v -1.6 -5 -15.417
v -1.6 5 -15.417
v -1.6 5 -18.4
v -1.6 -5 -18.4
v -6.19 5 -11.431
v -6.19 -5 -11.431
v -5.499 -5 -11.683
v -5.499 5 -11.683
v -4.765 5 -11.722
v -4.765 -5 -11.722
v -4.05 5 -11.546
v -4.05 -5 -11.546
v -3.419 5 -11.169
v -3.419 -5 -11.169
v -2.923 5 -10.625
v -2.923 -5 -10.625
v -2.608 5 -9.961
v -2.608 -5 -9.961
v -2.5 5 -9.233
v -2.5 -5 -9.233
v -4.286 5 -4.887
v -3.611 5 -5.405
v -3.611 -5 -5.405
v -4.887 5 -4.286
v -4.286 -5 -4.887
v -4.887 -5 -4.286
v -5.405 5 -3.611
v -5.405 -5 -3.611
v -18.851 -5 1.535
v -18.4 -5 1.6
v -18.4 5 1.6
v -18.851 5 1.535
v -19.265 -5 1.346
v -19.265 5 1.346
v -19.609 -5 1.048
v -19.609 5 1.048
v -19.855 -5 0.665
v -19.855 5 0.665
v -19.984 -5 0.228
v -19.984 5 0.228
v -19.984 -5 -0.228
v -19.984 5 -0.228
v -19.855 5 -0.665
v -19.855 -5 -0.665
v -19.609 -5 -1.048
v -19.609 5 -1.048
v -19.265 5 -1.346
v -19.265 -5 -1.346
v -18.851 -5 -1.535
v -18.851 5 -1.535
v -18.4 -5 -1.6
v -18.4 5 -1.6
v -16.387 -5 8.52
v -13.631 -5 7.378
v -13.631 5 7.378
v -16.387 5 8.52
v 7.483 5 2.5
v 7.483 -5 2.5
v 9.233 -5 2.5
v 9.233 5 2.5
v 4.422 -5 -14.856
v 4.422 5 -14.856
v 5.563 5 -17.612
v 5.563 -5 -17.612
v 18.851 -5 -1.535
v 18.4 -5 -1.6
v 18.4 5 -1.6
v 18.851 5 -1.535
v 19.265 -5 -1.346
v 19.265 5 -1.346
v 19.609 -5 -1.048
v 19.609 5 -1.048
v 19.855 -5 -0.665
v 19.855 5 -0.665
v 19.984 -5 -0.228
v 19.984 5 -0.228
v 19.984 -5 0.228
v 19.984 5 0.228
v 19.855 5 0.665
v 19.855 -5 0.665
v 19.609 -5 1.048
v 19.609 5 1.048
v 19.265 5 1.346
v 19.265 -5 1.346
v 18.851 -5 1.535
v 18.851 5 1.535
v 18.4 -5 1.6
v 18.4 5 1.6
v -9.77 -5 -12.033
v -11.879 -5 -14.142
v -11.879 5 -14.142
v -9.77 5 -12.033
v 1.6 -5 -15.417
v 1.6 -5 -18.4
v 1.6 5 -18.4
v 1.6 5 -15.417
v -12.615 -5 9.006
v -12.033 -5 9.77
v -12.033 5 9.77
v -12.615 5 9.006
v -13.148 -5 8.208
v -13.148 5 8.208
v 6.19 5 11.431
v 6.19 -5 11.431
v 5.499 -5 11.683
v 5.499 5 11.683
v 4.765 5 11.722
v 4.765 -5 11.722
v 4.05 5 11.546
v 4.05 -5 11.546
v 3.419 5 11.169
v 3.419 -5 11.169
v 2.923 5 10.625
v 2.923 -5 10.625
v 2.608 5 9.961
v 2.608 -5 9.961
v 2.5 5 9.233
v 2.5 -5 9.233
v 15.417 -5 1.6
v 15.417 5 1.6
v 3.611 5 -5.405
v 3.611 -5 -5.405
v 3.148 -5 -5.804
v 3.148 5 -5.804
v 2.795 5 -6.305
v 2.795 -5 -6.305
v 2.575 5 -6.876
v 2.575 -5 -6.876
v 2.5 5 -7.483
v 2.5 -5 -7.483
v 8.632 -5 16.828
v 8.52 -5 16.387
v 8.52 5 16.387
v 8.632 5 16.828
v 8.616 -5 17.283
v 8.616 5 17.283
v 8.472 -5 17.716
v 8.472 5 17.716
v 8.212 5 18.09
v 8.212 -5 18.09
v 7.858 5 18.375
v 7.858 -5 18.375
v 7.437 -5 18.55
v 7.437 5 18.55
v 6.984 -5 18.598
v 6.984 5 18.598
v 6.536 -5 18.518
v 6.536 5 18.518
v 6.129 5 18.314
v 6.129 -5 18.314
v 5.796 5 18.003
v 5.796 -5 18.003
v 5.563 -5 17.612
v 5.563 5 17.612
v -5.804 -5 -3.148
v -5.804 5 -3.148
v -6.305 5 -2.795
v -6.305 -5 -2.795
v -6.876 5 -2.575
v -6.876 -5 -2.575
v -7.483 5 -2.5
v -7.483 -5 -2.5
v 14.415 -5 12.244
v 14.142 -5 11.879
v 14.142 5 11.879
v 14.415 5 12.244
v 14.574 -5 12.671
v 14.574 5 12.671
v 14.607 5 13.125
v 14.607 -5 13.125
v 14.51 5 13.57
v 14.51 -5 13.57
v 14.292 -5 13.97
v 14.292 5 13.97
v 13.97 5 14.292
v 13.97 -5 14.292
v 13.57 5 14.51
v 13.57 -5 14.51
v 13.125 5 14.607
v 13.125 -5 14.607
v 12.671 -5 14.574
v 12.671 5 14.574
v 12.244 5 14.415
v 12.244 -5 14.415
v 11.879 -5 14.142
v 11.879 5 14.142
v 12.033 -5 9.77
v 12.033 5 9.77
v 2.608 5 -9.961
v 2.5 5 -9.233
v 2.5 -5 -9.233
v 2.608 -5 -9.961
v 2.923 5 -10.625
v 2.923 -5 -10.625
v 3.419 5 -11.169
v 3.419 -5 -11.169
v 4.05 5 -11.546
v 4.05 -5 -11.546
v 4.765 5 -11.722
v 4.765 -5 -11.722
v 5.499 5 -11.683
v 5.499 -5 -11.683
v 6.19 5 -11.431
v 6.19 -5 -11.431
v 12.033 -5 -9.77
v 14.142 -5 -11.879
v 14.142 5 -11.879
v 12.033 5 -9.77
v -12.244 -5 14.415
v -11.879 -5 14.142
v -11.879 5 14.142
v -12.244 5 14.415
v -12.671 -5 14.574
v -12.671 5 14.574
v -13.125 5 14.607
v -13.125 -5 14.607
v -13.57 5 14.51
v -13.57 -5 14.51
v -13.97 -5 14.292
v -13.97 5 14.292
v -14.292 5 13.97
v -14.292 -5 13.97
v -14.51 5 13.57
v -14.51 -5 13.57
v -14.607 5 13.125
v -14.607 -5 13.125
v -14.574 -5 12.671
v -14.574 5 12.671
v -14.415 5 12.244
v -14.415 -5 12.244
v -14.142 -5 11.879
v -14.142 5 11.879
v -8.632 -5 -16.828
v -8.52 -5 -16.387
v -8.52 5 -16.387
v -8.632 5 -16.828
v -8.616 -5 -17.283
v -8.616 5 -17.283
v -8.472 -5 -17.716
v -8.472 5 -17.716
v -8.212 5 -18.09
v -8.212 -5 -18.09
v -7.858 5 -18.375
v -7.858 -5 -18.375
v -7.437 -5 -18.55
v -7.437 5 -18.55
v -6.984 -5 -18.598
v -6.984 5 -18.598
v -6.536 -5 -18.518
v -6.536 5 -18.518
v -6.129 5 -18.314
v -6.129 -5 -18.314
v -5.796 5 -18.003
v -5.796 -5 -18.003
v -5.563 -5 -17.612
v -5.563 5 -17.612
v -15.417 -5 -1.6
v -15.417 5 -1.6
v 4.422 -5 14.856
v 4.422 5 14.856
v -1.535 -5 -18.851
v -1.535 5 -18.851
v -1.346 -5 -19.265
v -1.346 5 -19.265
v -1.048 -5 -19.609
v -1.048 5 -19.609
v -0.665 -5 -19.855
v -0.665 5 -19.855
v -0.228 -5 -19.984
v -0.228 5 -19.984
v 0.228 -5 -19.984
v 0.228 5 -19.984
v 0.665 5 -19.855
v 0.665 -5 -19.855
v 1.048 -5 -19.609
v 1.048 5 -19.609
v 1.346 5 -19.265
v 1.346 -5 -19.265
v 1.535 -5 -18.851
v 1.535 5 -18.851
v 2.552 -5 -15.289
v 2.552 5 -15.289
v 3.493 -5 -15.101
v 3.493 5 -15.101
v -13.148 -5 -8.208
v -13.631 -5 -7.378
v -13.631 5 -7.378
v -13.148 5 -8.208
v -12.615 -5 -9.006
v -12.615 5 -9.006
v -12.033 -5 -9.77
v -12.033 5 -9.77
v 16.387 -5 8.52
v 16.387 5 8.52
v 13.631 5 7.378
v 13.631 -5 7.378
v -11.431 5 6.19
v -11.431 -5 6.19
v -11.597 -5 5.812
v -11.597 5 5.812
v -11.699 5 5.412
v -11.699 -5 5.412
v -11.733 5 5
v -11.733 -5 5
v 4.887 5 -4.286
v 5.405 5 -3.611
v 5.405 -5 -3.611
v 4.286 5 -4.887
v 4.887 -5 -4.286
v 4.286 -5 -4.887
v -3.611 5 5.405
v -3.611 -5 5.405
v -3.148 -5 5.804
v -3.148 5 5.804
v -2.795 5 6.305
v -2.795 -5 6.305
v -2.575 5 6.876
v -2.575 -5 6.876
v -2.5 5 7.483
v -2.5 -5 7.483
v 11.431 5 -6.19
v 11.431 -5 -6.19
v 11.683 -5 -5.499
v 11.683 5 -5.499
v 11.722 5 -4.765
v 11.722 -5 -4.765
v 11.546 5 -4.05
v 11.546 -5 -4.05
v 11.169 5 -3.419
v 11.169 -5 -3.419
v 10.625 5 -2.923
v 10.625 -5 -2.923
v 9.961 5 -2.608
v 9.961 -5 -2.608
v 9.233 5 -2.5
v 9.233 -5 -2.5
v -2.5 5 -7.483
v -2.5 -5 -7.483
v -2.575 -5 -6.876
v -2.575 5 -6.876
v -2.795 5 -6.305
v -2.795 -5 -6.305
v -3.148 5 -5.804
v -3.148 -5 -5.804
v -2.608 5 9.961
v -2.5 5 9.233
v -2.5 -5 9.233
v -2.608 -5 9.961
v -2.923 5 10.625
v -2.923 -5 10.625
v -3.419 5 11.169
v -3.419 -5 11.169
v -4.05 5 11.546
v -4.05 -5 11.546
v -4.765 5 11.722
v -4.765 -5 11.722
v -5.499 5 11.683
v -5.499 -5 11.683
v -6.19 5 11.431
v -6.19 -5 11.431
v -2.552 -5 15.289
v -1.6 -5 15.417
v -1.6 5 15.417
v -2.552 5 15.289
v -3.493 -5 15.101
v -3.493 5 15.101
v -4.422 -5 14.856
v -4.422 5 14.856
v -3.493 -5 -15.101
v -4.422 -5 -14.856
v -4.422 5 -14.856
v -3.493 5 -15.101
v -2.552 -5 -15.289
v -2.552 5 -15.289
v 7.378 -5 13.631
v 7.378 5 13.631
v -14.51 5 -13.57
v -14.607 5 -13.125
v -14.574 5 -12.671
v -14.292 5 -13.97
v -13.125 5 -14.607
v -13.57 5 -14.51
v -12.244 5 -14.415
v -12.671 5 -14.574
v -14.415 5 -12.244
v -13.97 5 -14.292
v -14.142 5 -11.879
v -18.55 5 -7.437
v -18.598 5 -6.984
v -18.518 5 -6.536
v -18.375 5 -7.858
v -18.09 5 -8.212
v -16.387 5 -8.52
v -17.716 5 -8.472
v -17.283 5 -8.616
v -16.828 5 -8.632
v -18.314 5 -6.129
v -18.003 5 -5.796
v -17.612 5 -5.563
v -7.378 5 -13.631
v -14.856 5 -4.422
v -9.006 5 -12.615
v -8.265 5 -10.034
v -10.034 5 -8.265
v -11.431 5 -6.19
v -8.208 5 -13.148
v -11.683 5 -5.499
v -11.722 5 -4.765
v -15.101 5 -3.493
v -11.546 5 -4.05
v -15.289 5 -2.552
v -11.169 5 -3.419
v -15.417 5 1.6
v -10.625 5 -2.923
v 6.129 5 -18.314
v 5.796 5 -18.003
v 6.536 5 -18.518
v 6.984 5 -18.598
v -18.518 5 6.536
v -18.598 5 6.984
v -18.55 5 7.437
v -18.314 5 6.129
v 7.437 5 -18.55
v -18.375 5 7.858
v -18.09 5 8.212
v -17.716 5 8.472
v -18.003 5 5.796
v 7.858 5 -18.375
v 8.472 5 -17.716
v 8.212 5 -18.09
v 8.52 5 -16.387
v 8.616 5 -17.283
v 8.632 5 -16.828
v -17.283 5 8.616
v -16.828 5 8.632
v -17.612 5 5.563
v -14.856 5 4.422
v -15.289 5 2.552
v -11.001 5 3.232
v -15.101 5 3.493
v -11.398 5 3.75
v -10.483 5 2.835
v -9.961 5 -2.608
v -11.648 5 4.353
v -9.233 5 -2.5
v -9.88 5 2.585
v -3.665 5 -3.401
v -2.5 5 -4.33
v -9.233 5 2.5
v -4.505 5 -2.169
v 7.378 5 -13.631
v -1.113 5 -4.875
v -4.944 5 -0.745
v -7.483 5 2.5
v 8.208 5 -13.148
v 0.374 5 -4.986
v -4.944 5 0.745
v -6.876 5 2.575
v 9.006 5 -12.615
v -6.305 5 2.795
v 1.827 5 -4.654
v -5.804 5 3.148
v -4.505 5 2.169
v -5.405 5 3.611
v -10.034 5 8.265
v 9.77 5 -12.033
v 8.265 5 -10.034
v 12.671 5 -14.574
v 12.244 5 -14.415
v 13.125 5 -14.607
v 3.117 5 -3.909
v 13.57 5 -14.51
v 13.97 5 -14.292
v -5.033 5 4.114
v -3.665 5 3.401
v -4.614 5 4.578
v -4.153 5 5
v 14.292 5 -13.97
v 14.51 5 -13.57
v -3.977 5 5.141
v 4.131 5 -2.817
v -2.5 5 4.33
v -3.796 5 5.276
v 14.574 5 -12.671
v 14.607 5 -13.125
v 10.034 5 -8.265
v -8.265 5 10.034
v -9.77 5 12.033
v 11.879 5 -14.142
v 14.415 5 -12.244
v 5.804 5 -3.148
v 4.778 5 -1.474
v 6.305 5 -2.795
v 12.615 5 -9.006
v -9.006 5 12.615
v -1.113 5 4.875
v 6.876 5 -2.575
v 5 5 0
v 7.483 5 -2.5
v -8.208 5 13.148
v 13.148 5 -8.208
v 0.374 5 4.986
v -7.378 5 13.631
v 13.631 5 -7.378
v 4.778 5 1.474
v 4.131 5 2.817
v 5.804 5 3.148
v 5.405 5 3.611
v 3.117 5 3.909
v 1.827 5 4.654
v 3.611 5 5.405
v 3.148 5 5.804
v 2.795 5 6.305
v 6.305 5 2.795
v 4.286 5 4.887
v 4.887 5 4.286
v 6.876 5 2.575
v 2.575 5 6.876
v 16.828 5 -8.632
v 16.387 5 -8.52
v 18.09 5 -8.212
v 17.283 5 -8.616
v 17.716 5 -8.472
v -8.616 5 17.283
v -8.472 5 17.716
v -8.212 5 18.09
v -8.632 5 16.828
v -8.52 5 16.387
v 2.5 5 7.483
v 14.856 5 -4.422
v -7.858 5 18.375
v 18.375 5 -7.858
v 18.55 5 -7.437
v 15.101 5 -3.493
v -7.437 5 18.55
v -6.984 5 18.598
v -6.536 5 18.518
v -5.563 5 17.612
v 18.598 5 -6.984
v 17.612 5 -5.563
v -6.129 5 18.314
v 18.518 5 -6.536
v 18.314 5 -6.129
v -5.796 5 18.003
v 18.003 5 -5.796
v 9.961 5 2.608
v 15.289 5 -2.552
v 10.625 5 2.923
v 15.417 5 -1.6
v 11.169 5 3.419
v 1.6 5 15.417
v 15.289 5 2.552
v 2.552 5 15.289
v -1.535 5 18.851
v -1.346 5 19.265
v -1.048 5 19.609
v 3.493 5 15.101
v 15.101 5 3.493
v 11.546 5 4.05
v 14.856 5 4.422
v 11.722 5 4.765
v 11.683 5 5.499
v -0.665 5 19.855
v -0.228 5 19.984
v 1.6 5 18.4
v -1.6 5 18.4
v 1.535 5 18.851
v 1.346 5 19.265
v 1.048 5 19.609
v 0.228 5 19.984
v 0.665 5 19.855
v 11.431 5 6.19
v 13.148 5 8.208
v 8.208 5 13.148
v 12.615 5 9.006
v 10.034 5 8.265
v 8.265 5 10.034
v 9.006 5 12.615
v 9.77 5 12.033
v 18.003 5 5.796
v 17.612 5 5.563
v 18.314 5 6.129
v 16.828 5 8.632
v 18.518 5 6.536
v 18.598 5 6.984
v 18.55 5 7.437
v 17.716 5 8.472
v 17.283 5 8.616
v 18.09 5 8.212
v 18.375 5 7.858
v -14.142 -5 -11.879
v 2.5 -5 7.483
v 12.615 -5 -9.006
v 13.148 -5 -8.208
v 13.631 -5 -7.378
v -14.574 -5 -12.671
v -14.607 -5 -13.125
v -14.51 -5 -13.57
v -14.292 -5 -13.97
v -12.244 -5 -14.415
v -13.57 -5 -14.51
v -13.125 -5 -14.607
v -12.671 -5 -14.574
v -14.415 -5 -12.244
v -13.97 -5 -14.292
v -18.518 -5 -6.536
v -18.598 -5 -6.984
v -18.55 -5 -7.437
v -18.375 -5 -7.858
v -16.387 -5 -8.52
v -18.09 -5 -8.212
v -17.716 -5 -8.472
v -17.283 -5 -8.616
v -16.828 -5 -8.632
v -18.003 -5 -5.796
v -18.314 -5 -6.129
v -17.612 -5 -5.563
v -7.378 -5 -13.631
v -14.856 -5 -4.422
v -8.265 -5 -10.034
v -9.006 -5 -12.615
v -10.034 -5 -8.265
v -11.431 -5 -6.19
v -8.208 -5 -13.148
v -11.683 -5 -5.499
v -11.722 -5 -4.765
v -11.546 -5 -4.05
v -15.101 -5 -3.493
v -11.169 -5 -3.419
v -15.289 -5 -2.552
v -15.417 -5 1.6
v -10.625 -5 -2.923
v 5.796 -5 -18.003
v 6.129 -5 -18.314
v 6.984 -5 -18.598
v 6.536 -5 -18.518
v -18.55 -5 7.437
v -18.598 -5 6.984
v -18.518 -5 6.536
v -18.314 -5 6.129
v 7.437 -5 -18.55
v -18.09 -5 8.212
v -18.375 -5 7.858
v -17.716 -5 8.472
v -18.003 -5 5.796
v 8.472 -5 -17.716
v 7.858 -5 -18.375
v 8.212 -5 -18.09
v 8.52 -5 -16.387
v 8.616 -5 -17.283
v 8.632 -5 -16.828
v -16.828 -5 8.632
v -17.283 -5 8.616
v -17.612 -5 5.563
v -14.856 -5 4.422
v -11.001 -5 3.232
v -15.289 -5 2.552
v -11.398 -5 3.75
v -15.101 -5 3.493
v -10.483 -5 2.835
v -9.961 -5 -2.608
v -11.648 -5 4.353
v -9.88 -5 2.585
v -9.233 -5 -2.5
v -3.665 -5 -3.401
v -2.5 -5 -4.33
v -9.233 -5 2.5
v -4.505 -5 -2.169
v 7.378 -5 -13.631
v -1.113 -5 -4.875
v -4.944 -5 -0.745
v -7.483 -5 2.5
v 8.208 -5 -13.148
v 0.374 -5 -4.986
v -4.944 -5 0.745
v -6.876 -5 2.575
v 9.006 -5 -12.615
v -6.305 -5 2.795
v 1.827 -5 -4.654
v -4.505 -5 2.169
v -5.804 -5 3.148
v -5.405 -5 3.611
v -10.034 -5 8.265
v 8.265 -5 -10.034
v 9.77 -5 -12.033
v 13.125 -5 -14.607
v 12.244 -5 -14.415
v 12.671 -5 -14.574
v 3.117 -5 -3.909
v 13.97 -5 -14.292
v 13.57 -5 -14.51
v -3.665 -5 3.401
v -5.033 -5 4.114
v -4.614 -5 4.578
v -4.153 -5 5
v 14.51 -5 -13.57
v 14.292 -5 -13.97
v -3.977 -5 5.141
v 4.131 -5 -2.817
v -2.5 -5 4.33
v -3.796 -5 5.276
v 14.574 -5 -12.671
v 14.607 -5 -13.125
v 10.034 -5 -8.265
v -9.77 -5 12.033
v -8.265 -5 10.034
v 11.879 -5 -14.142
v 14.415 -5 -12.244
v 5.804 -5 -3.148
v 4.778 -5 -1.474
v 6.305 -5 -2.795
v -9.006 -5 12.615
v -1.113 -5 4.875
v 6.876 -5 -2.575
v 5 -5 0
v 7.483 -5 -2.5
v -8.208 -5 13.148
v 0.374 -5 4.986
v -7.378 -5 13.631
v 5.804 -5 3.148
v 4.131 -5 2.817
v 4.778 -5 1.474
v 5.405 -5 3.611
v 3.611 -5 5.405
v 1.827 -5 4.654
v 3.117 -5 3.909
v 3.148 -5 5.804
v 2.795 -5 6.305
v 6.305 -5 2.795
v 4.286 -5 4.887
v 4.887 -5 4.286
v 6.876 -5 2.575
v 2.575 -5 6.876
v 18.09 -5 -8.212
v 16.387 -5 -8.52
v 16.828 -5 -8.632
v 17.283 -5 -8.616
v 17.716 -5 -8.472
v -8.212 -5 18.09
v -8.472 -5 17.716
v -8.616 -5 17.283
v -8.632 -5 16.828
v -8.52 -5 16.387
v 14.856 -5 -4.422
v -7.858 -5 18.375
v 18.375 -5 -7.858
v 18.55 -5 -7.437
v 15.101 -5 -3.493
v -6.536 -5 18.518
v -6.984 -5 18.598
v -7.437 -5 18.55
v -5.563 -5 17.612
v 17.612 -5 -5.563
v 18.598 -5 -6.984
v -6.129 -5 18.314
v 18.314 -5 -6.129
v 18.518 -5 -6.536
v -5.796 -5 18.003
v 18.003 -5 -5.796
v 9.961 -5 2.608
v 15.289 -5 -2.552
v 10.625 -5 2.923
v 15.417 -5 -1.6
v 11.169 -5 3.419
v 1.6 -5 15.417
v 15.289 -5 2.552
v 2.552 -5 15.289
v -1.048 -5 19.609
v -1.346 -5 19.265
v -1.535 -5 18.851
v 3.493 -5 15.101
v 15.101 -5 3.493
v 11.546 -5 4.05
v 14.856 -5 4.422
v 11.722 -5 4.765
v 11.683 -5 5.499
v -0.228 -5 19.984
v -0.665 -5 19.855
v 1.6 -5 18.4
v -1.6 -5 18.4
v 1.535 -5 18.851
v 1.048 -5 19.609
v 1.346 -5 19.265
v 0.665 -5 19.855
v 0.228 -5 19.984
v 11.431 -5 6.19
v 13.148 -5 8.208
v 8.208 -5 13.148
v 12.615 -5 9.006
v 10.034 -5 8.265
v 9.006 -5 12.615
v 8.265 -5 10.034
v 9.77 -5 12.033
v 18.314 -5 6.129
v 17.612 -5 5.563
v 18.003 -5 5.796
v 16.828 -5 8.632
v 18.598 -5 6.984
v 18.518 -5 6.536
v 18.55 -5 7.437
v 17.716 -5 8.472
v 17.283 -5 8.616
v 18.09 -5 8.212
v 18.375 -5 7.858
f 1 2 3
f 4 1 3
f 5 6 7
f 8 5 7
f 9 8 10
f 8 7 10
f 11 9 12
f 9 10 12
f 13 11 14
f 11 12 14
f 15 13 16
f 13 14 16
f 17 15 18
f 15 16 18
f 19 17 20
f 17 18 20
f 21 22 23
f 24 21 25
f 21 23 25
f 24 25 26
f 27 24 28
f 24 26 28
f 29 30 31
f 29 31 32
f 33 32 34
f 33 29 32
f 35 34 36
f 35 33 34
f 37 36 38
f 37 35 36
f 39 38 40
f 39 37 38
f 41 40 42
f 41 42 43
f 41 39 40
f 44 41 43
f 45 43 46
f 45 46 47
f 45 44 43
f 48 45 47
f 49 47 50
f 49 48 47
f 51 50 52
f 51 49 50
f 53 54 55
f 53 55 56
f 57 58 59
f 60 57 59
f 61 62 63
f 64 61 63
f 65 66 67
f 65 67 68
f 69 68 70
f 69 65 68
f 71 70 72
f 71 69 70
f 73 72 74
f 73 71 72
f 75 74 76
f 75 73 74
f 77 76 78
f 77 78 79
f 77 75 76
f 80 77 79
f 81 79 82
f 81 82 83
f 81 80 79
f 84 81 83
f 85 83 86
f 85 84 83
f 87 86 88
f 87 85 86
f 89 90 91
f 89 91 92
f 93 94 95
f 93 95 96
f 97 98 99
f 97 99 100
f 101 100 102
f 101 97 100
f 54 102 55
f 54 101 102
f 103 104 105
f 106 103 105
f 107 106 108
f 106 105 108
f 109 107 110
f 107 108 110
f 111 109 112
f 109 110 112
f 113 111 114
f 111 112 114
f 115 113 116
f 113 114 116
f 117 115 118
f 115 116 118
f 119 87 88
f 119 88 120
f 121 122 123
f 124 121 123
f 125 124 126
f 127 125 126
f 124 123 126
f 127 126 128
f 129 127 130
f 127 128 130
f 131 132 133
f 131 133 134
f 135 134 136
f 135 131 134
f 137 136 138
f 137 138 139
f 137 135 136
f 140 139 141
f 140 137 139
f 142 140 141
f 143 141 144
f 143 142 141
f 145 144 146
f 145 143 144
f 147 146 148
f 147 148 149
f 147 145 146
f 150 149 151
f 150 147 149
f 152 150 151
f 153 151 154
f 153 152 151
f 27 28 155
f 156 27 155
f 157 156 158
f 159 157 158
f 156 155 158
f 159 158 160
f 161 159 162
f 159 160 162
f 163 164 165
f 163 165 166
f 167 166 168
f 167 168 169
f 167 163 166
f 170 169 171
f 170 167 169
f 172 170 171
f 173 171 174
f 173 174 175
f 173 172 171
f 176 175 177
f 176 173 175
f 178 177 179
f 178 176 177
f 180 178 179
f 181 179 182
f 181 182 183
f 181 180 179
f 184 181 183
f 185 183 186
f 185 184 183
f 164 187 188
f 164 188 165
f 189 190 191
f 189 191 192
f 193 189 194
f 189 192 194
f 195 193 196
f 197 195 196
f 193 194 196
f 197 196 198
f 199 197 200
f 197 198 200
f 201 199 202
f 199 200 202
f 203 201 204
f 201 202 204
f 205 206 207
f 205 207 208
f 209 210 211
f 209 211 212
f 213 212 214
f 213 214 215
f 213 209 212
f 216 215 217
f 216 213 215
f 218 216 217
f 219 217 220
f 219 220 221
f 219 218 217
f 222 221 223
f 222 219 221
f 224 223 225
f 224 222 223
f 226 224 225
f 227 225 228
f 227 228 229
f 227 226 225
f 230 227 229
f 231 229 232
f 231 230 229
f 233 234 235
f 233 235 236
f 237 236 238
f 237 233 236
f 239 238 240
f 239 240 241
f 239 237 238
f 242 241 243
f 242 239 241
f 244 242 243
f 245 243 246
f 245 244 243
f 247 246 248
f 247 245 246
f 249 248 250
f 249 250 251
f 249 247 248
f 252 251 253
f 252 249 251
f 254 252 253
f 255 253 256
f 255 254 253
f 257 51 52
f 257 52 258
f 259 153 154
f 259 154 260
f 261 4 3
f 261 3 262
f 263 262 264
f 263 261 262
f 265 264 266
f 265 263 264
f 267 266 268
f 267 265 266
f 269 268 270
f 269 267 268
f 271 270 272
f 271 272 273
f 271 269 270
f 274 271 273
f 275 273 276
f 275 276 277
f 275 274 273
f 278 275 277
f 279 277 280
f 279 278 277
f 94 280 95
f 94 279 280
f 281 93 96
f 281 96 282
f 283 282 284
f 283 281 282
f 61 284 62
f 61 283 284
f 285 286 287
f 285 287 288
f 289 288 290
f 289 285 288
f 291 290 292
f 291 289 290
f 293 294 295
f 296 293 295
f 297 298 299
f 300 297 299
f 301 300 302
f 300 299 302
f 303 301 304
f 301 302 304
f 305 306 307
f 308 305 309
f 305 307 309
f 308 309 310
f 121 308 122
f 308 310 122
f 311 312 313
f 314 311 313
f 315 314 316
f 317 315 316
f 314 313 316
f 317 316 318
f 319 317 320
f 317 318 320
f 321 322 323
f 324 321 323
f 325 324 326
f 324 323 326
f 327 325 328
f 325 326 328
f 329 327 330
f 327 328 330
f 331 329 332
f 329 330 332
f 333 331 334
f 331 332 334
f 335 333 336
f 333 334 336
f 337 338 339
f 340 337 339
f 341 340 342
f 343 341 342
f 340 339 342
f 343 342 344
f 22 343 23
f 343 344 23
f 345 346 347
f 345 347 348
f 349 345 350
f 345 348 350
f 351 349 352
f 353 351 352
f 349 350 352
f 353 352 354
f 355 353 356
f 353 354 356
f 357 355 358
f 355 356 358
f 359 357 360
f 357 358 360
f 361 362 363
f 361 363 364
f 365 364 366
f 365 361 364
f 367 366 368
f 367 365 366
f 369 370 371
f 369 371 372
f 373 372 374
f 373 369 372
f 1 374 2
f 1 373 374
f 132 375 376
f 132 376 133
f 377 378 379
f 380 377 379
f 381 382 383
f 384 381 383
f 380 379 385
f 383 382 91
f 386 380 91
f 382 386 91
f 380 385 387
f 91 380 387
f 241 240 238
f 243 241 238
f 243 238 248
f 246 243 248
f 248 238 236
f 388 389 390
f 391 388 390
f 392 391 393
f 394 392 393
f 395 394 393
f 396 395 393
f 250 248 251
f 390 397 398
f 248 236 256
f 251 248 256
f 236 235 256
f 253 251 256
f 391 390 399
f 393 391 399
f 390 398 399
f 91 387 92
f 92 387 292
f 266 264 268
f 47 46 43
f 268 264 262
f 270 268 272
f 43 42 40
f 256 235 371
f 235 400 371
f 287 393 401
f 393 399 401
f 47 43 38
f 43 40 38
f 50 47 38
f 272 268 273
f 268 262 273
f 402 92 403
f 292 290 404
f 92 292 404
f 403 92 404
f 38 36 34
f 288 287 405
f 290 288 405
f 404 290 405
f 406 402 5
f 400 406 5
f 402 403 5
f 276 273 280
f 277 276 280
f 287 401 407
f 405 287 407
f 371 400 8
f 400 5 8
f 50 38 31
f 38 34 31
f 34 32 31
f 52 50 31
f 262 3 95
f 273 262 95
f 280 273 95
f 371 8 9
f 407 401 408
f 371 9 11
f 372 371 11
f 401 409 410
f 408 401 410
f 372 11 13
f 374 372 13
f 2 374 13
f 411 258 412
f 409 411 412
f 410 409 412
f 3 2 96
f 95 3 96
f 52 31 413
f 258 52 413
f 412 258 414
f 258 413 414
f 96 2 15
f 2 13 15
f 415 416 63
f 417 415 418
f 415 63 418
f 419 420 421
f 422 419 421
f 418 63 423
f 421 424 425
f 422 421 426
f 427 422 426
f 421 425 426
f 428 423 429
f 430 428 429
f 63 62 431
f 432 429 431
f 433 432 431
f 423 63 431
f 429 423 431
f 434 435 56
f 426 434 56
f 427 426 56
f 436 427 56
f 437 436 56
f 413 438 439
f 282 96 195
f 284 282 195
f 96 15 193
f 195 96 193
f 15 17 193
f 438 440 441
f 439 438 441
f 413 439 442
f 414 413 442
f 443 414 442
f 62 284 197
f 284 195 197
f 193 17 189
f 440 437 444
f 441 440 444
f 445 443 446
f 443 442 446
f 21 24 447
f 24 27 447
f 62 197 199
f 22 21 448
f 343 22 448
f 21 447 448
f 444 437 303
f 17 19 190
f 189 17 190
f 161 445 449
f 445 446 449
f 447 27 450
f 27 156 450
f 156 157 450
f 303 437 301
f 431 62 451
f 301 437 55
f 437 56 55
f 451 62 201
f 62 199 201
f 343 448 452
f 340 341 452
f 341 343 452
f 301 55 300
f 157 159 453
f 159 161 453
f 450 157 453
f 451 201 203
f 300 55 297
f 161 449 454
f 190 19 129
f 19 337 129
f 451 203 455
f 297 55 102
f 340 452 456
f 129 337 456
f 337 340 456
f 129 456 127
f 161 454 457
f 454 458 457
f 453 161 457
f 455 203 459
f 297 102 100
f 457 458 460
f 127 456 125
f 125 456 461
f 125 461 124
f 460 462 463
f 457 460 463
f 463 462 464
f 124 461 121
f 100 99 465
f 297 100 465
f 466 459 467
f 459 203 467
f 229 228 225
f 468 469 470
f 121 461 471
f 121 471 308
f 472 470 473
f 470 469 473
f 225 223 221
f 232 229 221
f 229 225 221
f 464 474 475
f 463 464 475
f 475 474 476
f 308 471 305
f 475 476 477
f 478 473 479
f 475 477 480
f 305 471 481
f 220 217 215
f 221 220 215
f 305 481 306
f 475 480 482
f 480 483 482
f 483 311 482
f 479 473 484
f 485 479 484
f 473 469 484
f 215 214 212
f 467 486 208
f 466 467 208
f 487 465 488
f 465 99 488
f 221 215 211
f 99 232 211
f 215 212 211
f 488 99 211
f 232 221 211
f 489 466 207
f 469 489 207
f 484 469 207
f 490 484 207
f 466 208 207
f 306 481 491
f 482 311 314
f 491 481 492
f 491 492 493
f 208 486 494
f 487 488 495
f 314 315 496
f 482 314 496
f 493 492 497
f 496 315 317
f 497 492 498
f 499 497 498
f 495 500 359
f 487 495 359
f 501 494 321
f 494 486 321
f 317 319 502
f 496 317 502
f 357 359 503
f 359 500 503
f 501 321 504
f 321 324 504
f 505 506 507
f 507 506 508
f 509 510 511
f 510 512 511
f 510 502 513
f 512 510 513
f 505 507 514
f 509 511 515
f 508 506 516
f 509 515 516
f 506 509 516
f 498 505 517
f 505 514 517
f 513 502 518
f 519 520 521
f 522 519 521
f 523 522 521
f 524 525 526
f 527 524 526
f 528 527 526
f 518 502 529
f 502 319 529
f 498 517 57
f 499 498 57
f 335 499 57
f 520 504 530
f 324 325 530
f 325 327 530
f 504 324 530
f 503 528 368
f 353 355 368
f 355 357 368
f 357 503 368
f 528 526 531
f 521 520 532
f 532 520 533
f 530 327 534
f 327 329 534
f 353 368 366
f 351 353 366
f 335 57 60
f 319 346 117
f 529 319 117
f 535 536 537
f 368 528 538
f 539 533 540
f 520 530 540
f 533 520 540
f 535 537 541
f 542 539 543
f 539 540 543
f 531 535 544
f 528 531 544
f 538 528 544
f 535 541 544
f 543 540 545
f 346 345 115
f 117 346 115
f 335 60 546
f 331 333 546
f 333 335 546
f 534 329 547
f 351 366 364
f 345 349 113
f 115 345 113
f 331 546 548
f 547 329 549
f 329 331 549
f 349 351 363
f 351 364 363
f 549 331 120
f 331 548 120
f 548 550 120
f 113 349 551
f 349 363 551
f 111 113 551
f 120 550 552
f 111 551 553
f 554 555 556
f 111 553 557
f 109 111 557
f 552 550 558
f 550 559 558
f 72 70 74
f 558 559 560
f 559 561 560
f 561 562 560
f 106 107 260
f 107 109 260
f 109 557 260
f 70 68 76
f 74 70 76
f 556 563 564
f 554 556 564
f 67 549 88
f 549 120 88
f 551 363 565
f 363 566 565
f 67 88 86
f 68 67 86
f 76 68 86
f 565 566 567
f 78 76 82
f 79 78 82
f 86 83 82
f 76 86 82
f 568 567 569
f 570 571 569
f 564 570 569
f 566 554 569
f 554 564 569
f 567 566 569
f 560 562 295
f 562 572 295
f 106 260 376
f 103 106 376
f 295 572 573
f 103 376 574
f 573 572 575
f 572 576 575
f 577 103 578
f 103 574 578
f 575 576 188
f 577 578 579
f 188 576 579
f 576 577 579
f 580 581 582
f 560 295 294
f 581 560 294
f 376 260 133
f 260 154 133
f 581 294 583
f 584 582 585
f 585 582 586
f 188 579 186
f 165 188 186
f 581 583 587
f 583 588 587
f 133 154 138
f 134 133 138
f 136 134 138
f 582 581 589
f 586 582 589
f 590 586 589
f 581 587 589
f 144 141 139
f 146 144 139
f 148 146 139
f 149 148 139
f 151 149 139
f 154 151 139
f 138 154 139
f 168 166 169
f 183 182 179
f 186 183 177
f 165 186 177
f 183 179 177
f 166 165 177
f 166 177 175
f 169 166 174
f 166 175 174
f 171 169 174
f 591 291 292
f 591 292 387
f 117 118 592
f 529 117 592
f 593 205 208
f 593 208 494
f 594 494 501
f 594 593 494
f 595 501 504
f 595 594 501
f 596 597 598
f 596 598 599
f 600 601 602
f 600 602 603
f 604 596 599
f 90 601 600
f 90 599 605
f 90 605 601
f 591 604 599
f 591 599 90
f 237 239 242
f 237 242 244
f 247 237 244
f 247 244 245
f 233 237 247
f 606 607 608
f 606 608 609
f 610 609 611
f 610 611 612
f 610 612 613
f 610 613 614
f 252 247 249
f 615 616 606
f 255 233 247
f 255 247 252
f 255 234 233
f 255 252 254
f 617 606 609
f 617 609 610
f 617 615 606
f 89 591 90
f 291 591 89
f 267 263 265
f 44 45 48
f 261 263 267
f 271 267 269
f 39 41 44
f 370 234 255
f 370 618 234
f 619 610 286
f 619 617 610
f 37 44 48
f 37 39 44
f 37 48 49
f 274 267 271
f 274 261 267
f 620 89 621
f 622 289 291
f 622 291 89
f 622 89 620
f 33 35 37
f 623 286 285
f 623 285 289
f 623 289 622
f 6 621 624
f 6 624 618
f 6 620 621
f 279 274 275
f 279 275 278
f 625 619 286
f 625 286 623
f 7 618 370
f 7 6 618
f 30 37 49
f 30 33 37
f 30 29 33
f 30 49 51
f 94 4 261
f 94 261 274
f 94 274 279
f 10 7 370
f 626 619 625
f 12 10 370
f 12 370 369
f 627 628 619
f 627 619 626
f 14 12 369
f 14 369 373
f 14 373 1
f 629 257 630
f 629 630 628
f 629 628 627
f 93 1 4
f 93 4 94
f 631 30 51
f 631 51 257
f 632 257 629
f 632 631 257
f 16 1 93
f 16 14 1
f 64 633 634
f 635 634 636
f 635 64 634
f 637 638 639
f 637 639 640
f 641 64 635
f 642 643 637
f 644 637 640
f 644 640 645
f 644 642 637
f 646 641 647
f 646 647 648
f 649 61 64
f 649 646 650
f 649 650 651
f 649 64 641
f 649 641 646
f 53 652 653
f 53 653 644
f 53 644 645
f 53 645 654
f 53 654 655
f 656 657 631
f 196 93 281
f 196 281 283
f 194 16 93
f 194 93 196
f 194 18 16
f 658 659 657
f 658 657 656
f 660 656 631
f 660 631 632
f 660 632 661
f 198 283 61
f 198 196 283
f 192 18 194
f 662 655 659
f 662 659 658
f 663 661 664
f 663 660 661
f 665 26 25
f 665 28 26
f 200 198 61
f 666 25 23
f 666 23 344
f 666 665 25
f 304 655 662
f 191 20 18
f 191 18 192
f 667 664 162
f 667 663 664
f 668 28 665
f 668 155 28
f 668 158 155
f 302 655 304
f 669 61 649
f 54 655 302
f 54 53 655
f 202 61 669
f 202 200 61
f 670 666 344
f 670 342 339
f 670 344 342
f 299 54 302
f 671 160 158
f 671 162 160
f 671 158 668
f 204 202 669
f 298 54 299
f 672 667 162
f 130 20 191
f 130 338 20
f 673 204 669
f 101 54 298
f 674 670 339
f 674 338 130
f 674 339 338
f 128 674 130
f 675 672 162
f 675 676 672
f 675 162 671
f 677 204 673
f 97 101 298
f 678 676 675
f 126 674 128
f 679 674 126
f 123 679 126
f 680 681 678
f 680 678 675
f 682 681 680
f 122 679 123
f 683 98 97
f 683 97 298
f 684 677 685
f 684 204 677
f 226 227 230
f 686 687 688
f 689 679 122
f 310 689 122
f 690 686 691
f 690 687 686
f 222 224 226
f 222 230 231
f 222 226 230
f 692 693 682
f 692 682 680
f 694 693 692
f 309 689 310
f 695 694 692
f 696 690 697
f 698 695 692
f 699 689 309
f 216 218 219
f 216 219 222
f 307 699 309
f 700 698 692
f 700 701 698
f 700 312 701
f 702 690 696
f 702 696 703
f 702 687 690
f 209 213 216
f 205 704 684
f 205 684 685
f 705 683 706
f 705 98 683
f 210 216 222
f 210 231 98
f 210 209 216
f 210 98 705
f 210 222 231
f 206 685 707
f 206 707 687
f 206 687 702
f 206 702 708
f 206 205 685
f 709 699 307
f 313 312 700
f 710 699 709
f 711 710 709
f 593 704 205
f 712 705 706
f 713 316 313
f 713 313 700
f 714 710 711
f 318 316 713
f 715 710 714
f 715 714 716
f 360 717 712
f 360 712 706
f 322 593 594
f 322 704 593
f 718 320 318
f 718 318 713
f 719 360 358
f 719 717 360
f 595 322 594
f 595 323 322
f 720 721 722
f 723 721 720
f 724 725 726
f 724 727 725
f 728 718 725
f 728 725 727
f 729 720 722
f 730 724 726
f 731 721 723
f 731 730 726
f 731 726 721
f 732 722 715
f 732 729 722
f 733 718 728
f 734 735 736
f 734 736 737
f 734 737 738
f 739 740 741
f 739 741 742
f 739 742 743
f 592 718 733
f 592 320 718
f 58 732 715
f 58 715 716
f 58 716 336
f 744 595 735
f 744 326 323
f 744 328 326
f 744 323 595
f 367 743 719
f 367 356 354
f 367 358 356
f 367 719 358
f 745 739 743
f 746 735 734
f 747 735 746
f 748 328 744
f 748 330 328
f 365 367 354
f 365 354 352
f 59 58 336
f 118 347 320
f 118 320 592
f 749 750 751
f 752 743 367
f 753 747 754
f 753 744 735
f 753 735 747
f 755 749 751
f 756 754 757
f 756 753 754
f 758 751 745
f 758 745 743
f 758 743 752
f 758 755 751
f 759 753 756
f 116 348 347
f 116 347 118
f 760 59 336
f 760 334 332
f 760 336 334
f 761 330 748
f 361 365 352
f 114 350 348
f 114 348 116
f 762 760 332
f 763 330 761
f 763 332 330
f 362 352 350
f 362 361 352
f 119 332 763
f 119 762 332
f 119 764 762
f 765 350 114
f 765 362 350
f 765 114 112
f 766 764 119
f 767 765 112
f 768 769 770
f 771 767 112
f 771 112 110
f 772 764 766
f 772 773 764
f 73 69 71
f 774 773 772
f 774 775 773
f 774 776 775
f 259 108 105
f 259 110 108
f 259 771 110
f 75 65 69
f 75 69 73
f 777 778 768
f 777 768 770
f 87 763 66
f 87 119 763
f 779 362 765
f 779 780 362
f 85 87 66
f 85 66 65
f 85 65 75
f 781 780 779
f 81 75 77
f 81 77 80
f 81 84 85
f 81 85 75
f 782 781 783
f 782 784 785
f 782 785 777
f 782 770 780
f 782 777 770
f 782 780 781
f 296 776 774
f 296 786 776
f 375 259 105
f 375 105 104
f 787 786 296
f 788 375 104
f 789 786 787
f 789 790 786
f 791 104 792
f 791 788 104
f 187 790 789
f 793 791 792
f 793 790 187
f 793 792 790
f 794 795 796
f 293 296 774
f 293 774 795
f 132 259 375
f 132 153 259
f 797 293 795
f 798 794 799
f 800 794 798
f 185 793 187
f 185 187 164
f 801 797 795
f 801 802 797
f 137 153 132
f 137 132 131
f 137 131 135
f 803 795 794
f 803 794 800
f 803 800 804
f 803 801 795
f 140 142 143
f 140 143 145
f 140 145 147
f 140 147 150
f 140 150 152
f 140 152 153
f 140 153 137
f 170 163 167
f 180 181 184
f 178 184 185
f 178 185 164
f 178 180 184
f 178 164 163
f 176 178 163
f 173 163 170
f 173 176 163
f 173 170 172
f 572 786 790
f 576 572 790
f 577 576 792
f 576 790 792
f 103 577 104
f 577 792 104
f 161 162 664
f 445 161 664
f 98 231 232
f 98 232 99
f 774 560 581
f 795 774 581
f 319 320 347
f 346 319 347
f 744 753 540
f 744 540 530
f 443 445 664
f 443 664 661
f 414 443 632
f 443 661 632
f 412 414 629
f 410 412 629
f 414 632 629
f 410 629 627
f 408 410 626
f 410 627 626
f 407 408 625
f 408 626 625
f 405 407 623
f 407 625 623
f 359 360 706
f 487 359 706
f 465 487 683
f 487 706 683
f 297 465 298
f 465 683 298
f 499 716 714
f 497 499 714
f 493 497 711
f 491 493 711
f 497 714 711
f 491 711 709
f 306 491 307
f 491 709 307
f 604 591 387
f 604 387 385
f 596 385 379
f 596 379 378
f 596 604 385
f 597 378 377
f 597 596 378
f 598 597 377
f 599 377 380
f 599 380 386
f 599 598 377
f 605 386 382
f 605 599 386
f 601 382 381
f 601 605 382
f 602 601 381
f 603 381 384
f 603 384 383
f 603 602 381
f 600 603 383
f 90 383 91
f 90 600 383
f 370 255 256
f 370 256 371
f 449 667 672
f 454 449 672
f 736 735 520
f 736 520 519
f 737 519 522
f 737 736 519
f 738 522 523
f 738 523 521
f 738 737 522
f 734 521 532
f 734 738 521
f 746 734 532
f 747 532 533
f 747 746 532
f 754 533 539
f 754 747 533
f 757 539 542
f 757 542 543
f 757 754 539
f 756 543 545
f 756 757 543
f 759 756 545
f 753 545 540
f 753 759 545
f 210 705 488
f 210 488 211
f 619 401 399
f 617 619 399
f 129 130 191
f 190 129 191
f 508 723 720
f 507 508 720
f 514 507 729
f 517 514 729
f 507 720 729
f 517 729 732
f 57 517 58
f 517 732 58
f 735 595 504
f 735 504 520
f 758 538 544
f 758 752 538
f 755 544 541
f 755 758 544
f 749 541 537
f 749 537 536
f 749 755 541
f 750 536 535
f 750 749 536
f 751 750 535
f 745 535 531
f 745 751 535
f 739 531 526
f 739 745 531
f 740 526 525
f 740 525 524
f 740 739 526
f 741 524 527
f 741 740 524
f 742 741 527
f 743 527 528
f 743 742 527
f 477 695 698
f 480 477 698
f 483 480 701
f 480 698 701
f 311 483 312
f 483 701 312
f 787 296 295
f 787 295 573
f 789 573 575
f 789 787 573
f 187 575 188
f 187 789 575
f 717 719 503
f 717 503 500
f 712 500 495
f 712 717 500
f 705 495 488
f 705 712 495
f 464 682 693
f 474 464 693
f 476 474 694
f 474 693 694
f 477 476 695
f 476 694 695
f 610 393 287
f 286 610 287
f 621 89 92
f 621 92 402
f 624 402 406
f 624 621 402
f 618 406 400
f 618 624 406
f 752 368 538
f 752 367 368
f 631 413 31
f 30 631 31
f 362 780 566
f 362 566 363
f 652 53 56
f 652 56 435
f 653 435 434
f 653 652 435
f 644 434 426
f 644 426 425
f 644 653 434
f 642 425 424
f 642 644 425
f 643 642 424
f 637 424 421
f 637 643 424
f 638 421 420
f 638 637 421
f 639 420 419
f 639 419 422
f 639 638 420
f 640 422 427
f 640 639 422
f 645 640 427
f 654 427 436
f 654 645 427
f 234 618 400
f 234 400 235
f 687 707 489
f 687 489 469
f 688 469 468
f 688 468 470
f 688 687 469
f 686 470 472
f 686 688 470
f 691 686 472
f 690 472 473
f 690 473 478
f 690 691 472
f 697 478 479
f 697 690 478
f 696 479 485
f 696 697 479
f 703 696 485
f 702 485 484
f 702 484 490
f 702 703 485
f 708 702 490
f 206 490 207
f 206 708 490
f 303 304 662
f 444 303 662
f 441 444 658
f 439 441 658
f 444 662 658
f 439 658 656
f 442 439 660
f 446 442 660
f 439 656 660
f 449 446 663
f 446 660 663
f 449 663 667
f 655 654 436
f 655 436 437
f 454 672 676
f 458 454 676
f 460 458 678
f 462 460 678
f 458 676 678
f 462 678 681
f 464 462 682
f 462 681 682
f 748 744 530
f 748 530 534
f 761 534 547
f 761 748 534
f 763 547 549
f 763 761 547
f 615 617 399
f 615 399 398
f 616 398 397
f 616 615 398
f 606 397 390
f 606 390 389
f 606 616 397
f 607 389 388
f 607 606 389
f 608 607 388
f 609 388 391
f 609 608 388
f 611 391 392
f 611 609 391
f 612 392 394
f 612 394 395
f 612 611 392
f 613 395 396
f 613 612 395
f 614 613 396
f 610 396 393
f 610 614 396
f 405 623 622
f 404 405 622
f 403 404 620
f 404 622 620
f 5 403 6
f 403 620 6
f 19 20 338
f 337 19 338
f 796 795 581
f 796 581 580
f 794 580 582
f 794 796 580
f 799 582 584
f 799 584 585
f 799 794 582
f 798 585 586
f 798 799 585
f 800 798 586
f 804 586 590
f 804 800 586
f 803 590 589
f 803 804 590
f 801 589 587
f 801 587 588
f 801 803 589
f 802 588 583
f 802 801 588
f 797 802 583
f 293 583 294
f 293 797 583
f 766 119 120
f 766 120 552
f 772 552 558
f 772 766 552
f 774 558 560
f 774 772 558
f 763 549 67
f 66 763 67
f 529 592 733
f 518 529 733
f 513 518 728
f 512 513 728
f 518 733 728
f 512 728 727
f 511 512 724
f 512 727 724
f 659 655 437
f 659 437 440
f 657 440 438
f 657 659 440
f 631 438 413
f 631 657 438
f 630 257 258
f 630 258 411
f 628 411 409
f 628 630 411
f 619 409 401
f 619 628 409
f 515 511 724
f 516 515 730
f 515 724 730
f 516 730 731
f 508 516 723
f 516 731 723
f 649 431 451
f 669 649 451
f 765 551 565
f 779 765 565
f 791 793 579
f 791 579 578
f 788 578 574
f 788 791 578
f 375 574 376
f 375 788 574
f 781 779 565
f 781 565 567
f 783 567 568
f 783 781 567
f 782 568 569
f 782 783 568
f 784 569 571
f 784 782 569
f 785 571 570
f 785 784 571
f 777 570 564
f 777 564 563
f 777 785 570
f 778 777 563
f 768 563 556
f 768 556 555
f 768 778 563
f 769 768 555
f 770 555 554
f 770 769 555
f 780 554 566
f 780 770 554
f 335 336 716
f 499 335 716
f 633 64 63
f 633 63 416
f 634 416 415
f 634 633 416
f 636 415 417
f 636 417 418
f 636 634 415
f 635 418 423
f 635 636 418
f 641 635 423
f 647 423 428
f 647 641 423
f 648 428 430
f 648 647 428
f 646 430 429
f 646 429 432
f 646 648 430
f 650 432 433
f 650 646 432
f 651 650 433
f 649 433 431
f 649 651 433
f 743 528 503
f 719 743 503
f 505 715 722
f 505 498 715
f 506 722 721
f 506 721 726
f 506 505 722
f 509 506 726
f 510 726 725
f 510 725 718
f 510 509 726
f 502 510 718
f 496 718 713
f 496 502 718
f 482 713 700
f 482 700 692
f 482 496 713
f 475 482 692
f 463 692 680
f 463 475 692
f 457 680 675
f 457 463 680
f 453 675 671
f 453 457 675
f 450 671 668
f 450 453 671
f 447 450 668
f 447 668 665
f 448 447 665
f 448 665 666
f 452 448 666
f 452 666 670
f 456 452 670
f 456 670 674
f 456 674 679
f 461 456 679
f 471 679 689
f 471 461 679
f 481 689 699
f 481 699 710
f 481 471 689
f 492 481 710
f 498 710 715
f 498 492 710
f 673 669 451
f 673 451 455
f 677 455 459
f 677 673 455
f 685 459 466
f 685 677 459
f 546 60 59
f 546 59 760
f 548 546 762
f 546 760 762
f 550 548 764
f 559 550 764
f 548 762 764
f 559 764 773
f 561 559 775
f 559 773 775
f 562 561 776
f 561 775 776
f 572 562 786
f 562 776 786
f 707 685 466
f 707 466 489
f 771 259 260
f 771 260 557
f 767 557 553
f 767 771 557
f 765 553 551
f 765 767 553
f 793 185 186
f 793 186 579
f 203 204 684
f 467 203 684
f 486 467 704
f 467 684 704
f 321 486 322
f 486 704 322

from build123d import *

# Parameters (mm, degrees)
F0_R     = 5
F1_DEPTH = 5
F3_DEPTH = 10


with BuildPart() as f1:
    # F0 (on Front) → F1 (new body, symmetric)
    with BuildSketch(Plane.XZ):
        with BuildLine():
            Line((-8.519582, 16.38709), (-7.378114, 13.63134))
            ThreePointArc((-7.378114, 13.63134), (-8.611339, 12.887779), (-9.770235, 12.032976))
            Line((-9.770235, 12.032976), (-11.879394, 14.142136))
            ThreePointArc((-11.879394, 14.142136), (-14.142136, 14.142136), (-14.142136, 11.879394))
            Line((-14.142136, 11.879394), (-12.032976, 9.770235))
            ThreePointArc((-12.032976, 9.770235), (-12.887779, 8.611339), (-13.63134, 7.378114))
            Line((-13.63134, 7.378114), (-16.38709, 8.519582))
            ThreePointArc((-16.38709, 8.519582), (-18.477591, 7.653669), (-17.611677, 5.563168))
            Line((-17.611677, 5.563168), (-14.855927, 4.421699))
            ThreePointArc((-14.855927, 4.421699), (-15.202172, 3.0239), (-15.417198, 1.6))
            Line((-15.417198, 1.6), (-18.4, 1.6))
            ThreePointArc((-18.4, 1.6), (-20, 0), (-18.4, -1.6))
            Line((-18.4, -1.6), (-15.417198, -1.6))
            ThreePointArc((-15.417198, -1.6), (-15.202172, -3.0239), (-14.855927, -4.421699))
            Line((-14.855927, -4.421699), (-17.611677, -5.563168))
            ThreePointArc((-17.611677, -5.563168), (-18.477591, -7.653669), (-16.38709, -8.519582))
            Line((-16.38709, -8.519582), (-13.63134, -7.378114))
            ThreePointArc((-13.63134, -7.378114), (-12.887779, -8.611339), (-12.032976, -9.770235))
            Line((-12.032976, -9.770235), (-14.142136, -11.879394))
            ThreePointArc((-14.142136, -11.879394), (-14.142136, -14.142136), (-11.879394, -14.142136))
            Line((-11.879394, -14.142136), (-9.770235, -12.032976))
            ThreePointArc((-9.770235, -12.032976), (-8.611339, -12.887779), (-7.378114, -13.63134))
            Line((-7.378114, -13.63134), (-8.519582, -16.38709))
            ThreePointArc((-8.519582, -16.38709), (-7.653669, -18.477591), (-5.563168, -17.611677))
            Line((-5.563168, -17.611677), (-4.421699, -14.855927))
            ThreePointArc((-4.421699, -14.855927), (-3.0239, -15.202172), (-1.6, -15.417198))
            Line((-1.6, -15.417198), (-1.6, -18.4))
            ThreePointArc((-1.6, -18.4), (0, -20), (1.6, -18.4))
            Line((1.6, -18.4), (1.6, -15.417198))
            ThreePointArc((1.6, -15.417198), (3.0239, -15.202172), (4.421699, -14.855927))
            Line((4.421699, -14.855927), (5.563168, -17.611677))
            ThreePointArc((5.563168, -17.611677), (7.653669, -18.477591), (8.519582, -16.38709))
            Line((8.519582, -16.38709), (7.378114, -13.63134))
            ThreePointArc((7.378114, -13.63134), (8.611339, -12.887779), (9.770235, -12.032976))
            Line((9.770235, -12.032976), (11.879394, -14.142136))
            ThreePointArc((11.879394, -14.142136), (14.142136, -14.142136), (14.142136, -11.879394))
            Line((14.142136, -11.879394), (12.032976, -9.770235))
            ThreePointArc((12.032976, -9.770235), (12.887779, -8.611339), (13.63134, -7.378114))
            Line((13.63134, -7.378114), (16.38709, -8.519582))
            ThreePointArc((16.38709, -8.519582), (18.477591, -7.653669), (17.611677, -5.563168))
            Line((17.611677, -5.563168), (14.855927, -4.421699))
            ThreePointArc((14.855927, -4.421699), (15.202172, -3.0239), (15.417198, -1.6))
            Line((15.417198, -1.6), (18.4, -1.6))
            ThreePointArc((18.4, -1.6), (20, 0), (18.4, 1.6))
            Line((18.4, 1.6), (15.417198, 1.6))
            ThreePointArc((15.417198, 1.6), (15.202172, 3.0239), (14.855927, 4.421699))
            Line((14.855927, 4.421699), (17.611677, 5.563168))
            ThreePointArc((17.611677, 5.563168), (18.477591, 7.653669), (16.38709, 8.519582))
            Line((16.38709, 8.519582), (13.63134, 7.378114))
            ThreePointArc((13.63134, 7.378114), (12.887779, 8.611339), (12.032976, 9.770235))
            ThreePointArc((12.032976, 9.770235), (10.960155, 10.960155), (9.770235, 12.032976))
            ThreePointArc((9.770235, 12.032976), (8.611339, 12.887779), (7.378114, 13.63134))
            Line((7.378114, 13.63134), (8.519582, 16.38709))
            ThreePointArc((8.519582, 16.38709), (7.653669, 18.477591), (5.563168, 17.611677))
            Line((5.563168, 17.611677), (4.421699, 14.855927))
            ThreePointArc((4.421699, 14.855927), (3.0239, 15.202172), (1.6, 15.417198))
            Line((1.6, 15.417198), (1.6, 18.4))
            ThreePointArc((1.6, 18.4), (0, 20), (-1.6, 18.4))
            Line((-1.6, 18.4), (-1.6, 15.417198))
            ThreePointArc((-1.6, 15.417198), (-3.0239, 15.202172), (-4.421699, 14.855927))
            Line((-4.421699, 14.855927), (-5.563168, 17.611677))
            ThreePointArc((-5.563168, 17.611677), (-7.653669, 18.477591), (-8.519582, 16.38709))
        make_face()
        Circle(F0_R, mode=Mode.SUBTRACT)
        with BuildLine():
            Line((11.879394, 14.142136), (9.770235, 12.032976))
            ThreePointArc((9.770235, 12.032976), (10.960155, 10.960155), (12.032976, 9.770235))
            Line((12.032976, 9.770235), (14.142136, 11.879394))
            ThreePointArc((14.142136, 11.879394), (14.142136, 14.142136), (11.879394, 14.142136))
        make_face()
    extrude(amount=F1_DEPTH, both=True)

    # F2 (on face) → F3 (cut)
    with BuildSketch(Plane.XZ.offset(5)):
        with BuildLine():
            ThreePointArc((-6.190476, 11.431448), (-9.192388, 9.192388), (-11.431448, 6.190476))
            ThreePointArc((-11.431448, 6.190476), (-11.656508, 5.614049), (-11.733093, 5))
            Line((-11.733093, 5), (-4.153312, 5))
            ThreePointArc((-4.153312, 5), (-3.887479, 5.209367), (-3.611111, 5.404616))
            ThreePointArc((-3.611111, 5.404616), (-2.795207, 6.304803), (-2.5, 7.483315))
            Line((-2.5, 7.483315), (-2.5, 9.233093))
            ThreePointArc((-2.5, 9.233093), (-3.720584, 11.380904), (-6.190476, 11.431448))
        make_face()
        with BuildLine():
            Line((-4.153312, 5), (-11.733093, 5))
            ThreePointArc((-11.733093, 5), (-11.00086, 3.232233), (-9.233093, 2.5))
            Line((-9.233093, 2.5), (-7.483315, 2.5))
            ThreePointArc((-7.483315, 2.5), (-6.304803, 2.795207), (-5.404616, 3.611111))
            ThreePointArc((-5.404616, 3.611111), (-4.829156, 4.350776), (-4.153312, 5))
        make_face()
        with BuildLine():
            ThreePointArc((6.190476, 11.431448), (3.720584, 11.380904), (2.5, 9.233093))
            Line((2.5, 9.233093), (2.5, 7.483315))
            ThreePointArc((2.5, 7.483315), (2.795207, 6.304803), (3.611111, 5.404616))
            ThreePointArc((3.611111, 5.404616), (4.596194, 4.596194), (5.404616, 3.611111))
            ThreePointArc((5.404616, 3.611111), (6.304803, 2.795207), (7.483315, 2.5))
            Line((7.483315, 2.5), (9.233093, 2.5))
            ThreePointArc((9.233093, 2.5), (11.380904, 3.720584), (11.431448, 6.190476))
            ThreePointArc((11.431448, 6.190476), (9.192388, 9.192388), (6.190476, 11.431448))
        make_face()
        with BuildLine():
            Line((-7.483315, -2.5), (-9.233093, -2.5))
            ThreePointArc((-9.233093, -2.5), (-11.380904, -3.720584), (-11.431448, -6.190476))
            ThreePointArc((-11.431448, -6.190476), (-9.192388, -9.192388), (-6.190476, -11.431448))
            ThreePointArc((-6.190476, -11.431448), (-3.720584, -11.380904), (-2.5, -9.233093))
            Line((-2.5, -9.233093), (-2.5, -7.483315))
            ThreePointArc((-2.5, -7.483315), (-2.795207, -6.304803), (-3.611111, -5.404616))
            ThreePointArc((-3.611111, -5.404616), (-4.596194, -4.596194), (-5.404616, -3.611111))
            ThreePointArc((-5.404616, -3.611111), (-6.304803, -2.795207), (-7.483315, -2.5))
        make_face()
        with BuildLine():
            ThreePointArc((5.404616, -3.611111), (4.596194, -4.596194), (3.611111, -5.404616))
            ThreePointArc((3.611111, -5.404616), (2.795207, -6.304803), (2.5, -7.483315))
            Line((2.5, -7.483315), (2.5, -9.233093))
            ThreePointArc((2.5, -9.233093), (3.720584, -11.380904), (6.190476, -11.431448))
            ThreePointArc((6.190476, -11.431448), (9.192388, -9.192388), (11.431448, -6.190476))
            ThreePointArc((11.431448, -6.190476), (11.380904, -3.720584), (9.233093, -2.5))
            Line((9.233093, -2.5), (7.483315, -2.5))
            ThreePointArc((7.483315, -2.5), (6.304803, -2.795207), (5.404616, -3.611111))
        make_face()
    extrude(amount=-F3_DEPTH, mode=Mode.SUBTRACT)


solid = f1.part
